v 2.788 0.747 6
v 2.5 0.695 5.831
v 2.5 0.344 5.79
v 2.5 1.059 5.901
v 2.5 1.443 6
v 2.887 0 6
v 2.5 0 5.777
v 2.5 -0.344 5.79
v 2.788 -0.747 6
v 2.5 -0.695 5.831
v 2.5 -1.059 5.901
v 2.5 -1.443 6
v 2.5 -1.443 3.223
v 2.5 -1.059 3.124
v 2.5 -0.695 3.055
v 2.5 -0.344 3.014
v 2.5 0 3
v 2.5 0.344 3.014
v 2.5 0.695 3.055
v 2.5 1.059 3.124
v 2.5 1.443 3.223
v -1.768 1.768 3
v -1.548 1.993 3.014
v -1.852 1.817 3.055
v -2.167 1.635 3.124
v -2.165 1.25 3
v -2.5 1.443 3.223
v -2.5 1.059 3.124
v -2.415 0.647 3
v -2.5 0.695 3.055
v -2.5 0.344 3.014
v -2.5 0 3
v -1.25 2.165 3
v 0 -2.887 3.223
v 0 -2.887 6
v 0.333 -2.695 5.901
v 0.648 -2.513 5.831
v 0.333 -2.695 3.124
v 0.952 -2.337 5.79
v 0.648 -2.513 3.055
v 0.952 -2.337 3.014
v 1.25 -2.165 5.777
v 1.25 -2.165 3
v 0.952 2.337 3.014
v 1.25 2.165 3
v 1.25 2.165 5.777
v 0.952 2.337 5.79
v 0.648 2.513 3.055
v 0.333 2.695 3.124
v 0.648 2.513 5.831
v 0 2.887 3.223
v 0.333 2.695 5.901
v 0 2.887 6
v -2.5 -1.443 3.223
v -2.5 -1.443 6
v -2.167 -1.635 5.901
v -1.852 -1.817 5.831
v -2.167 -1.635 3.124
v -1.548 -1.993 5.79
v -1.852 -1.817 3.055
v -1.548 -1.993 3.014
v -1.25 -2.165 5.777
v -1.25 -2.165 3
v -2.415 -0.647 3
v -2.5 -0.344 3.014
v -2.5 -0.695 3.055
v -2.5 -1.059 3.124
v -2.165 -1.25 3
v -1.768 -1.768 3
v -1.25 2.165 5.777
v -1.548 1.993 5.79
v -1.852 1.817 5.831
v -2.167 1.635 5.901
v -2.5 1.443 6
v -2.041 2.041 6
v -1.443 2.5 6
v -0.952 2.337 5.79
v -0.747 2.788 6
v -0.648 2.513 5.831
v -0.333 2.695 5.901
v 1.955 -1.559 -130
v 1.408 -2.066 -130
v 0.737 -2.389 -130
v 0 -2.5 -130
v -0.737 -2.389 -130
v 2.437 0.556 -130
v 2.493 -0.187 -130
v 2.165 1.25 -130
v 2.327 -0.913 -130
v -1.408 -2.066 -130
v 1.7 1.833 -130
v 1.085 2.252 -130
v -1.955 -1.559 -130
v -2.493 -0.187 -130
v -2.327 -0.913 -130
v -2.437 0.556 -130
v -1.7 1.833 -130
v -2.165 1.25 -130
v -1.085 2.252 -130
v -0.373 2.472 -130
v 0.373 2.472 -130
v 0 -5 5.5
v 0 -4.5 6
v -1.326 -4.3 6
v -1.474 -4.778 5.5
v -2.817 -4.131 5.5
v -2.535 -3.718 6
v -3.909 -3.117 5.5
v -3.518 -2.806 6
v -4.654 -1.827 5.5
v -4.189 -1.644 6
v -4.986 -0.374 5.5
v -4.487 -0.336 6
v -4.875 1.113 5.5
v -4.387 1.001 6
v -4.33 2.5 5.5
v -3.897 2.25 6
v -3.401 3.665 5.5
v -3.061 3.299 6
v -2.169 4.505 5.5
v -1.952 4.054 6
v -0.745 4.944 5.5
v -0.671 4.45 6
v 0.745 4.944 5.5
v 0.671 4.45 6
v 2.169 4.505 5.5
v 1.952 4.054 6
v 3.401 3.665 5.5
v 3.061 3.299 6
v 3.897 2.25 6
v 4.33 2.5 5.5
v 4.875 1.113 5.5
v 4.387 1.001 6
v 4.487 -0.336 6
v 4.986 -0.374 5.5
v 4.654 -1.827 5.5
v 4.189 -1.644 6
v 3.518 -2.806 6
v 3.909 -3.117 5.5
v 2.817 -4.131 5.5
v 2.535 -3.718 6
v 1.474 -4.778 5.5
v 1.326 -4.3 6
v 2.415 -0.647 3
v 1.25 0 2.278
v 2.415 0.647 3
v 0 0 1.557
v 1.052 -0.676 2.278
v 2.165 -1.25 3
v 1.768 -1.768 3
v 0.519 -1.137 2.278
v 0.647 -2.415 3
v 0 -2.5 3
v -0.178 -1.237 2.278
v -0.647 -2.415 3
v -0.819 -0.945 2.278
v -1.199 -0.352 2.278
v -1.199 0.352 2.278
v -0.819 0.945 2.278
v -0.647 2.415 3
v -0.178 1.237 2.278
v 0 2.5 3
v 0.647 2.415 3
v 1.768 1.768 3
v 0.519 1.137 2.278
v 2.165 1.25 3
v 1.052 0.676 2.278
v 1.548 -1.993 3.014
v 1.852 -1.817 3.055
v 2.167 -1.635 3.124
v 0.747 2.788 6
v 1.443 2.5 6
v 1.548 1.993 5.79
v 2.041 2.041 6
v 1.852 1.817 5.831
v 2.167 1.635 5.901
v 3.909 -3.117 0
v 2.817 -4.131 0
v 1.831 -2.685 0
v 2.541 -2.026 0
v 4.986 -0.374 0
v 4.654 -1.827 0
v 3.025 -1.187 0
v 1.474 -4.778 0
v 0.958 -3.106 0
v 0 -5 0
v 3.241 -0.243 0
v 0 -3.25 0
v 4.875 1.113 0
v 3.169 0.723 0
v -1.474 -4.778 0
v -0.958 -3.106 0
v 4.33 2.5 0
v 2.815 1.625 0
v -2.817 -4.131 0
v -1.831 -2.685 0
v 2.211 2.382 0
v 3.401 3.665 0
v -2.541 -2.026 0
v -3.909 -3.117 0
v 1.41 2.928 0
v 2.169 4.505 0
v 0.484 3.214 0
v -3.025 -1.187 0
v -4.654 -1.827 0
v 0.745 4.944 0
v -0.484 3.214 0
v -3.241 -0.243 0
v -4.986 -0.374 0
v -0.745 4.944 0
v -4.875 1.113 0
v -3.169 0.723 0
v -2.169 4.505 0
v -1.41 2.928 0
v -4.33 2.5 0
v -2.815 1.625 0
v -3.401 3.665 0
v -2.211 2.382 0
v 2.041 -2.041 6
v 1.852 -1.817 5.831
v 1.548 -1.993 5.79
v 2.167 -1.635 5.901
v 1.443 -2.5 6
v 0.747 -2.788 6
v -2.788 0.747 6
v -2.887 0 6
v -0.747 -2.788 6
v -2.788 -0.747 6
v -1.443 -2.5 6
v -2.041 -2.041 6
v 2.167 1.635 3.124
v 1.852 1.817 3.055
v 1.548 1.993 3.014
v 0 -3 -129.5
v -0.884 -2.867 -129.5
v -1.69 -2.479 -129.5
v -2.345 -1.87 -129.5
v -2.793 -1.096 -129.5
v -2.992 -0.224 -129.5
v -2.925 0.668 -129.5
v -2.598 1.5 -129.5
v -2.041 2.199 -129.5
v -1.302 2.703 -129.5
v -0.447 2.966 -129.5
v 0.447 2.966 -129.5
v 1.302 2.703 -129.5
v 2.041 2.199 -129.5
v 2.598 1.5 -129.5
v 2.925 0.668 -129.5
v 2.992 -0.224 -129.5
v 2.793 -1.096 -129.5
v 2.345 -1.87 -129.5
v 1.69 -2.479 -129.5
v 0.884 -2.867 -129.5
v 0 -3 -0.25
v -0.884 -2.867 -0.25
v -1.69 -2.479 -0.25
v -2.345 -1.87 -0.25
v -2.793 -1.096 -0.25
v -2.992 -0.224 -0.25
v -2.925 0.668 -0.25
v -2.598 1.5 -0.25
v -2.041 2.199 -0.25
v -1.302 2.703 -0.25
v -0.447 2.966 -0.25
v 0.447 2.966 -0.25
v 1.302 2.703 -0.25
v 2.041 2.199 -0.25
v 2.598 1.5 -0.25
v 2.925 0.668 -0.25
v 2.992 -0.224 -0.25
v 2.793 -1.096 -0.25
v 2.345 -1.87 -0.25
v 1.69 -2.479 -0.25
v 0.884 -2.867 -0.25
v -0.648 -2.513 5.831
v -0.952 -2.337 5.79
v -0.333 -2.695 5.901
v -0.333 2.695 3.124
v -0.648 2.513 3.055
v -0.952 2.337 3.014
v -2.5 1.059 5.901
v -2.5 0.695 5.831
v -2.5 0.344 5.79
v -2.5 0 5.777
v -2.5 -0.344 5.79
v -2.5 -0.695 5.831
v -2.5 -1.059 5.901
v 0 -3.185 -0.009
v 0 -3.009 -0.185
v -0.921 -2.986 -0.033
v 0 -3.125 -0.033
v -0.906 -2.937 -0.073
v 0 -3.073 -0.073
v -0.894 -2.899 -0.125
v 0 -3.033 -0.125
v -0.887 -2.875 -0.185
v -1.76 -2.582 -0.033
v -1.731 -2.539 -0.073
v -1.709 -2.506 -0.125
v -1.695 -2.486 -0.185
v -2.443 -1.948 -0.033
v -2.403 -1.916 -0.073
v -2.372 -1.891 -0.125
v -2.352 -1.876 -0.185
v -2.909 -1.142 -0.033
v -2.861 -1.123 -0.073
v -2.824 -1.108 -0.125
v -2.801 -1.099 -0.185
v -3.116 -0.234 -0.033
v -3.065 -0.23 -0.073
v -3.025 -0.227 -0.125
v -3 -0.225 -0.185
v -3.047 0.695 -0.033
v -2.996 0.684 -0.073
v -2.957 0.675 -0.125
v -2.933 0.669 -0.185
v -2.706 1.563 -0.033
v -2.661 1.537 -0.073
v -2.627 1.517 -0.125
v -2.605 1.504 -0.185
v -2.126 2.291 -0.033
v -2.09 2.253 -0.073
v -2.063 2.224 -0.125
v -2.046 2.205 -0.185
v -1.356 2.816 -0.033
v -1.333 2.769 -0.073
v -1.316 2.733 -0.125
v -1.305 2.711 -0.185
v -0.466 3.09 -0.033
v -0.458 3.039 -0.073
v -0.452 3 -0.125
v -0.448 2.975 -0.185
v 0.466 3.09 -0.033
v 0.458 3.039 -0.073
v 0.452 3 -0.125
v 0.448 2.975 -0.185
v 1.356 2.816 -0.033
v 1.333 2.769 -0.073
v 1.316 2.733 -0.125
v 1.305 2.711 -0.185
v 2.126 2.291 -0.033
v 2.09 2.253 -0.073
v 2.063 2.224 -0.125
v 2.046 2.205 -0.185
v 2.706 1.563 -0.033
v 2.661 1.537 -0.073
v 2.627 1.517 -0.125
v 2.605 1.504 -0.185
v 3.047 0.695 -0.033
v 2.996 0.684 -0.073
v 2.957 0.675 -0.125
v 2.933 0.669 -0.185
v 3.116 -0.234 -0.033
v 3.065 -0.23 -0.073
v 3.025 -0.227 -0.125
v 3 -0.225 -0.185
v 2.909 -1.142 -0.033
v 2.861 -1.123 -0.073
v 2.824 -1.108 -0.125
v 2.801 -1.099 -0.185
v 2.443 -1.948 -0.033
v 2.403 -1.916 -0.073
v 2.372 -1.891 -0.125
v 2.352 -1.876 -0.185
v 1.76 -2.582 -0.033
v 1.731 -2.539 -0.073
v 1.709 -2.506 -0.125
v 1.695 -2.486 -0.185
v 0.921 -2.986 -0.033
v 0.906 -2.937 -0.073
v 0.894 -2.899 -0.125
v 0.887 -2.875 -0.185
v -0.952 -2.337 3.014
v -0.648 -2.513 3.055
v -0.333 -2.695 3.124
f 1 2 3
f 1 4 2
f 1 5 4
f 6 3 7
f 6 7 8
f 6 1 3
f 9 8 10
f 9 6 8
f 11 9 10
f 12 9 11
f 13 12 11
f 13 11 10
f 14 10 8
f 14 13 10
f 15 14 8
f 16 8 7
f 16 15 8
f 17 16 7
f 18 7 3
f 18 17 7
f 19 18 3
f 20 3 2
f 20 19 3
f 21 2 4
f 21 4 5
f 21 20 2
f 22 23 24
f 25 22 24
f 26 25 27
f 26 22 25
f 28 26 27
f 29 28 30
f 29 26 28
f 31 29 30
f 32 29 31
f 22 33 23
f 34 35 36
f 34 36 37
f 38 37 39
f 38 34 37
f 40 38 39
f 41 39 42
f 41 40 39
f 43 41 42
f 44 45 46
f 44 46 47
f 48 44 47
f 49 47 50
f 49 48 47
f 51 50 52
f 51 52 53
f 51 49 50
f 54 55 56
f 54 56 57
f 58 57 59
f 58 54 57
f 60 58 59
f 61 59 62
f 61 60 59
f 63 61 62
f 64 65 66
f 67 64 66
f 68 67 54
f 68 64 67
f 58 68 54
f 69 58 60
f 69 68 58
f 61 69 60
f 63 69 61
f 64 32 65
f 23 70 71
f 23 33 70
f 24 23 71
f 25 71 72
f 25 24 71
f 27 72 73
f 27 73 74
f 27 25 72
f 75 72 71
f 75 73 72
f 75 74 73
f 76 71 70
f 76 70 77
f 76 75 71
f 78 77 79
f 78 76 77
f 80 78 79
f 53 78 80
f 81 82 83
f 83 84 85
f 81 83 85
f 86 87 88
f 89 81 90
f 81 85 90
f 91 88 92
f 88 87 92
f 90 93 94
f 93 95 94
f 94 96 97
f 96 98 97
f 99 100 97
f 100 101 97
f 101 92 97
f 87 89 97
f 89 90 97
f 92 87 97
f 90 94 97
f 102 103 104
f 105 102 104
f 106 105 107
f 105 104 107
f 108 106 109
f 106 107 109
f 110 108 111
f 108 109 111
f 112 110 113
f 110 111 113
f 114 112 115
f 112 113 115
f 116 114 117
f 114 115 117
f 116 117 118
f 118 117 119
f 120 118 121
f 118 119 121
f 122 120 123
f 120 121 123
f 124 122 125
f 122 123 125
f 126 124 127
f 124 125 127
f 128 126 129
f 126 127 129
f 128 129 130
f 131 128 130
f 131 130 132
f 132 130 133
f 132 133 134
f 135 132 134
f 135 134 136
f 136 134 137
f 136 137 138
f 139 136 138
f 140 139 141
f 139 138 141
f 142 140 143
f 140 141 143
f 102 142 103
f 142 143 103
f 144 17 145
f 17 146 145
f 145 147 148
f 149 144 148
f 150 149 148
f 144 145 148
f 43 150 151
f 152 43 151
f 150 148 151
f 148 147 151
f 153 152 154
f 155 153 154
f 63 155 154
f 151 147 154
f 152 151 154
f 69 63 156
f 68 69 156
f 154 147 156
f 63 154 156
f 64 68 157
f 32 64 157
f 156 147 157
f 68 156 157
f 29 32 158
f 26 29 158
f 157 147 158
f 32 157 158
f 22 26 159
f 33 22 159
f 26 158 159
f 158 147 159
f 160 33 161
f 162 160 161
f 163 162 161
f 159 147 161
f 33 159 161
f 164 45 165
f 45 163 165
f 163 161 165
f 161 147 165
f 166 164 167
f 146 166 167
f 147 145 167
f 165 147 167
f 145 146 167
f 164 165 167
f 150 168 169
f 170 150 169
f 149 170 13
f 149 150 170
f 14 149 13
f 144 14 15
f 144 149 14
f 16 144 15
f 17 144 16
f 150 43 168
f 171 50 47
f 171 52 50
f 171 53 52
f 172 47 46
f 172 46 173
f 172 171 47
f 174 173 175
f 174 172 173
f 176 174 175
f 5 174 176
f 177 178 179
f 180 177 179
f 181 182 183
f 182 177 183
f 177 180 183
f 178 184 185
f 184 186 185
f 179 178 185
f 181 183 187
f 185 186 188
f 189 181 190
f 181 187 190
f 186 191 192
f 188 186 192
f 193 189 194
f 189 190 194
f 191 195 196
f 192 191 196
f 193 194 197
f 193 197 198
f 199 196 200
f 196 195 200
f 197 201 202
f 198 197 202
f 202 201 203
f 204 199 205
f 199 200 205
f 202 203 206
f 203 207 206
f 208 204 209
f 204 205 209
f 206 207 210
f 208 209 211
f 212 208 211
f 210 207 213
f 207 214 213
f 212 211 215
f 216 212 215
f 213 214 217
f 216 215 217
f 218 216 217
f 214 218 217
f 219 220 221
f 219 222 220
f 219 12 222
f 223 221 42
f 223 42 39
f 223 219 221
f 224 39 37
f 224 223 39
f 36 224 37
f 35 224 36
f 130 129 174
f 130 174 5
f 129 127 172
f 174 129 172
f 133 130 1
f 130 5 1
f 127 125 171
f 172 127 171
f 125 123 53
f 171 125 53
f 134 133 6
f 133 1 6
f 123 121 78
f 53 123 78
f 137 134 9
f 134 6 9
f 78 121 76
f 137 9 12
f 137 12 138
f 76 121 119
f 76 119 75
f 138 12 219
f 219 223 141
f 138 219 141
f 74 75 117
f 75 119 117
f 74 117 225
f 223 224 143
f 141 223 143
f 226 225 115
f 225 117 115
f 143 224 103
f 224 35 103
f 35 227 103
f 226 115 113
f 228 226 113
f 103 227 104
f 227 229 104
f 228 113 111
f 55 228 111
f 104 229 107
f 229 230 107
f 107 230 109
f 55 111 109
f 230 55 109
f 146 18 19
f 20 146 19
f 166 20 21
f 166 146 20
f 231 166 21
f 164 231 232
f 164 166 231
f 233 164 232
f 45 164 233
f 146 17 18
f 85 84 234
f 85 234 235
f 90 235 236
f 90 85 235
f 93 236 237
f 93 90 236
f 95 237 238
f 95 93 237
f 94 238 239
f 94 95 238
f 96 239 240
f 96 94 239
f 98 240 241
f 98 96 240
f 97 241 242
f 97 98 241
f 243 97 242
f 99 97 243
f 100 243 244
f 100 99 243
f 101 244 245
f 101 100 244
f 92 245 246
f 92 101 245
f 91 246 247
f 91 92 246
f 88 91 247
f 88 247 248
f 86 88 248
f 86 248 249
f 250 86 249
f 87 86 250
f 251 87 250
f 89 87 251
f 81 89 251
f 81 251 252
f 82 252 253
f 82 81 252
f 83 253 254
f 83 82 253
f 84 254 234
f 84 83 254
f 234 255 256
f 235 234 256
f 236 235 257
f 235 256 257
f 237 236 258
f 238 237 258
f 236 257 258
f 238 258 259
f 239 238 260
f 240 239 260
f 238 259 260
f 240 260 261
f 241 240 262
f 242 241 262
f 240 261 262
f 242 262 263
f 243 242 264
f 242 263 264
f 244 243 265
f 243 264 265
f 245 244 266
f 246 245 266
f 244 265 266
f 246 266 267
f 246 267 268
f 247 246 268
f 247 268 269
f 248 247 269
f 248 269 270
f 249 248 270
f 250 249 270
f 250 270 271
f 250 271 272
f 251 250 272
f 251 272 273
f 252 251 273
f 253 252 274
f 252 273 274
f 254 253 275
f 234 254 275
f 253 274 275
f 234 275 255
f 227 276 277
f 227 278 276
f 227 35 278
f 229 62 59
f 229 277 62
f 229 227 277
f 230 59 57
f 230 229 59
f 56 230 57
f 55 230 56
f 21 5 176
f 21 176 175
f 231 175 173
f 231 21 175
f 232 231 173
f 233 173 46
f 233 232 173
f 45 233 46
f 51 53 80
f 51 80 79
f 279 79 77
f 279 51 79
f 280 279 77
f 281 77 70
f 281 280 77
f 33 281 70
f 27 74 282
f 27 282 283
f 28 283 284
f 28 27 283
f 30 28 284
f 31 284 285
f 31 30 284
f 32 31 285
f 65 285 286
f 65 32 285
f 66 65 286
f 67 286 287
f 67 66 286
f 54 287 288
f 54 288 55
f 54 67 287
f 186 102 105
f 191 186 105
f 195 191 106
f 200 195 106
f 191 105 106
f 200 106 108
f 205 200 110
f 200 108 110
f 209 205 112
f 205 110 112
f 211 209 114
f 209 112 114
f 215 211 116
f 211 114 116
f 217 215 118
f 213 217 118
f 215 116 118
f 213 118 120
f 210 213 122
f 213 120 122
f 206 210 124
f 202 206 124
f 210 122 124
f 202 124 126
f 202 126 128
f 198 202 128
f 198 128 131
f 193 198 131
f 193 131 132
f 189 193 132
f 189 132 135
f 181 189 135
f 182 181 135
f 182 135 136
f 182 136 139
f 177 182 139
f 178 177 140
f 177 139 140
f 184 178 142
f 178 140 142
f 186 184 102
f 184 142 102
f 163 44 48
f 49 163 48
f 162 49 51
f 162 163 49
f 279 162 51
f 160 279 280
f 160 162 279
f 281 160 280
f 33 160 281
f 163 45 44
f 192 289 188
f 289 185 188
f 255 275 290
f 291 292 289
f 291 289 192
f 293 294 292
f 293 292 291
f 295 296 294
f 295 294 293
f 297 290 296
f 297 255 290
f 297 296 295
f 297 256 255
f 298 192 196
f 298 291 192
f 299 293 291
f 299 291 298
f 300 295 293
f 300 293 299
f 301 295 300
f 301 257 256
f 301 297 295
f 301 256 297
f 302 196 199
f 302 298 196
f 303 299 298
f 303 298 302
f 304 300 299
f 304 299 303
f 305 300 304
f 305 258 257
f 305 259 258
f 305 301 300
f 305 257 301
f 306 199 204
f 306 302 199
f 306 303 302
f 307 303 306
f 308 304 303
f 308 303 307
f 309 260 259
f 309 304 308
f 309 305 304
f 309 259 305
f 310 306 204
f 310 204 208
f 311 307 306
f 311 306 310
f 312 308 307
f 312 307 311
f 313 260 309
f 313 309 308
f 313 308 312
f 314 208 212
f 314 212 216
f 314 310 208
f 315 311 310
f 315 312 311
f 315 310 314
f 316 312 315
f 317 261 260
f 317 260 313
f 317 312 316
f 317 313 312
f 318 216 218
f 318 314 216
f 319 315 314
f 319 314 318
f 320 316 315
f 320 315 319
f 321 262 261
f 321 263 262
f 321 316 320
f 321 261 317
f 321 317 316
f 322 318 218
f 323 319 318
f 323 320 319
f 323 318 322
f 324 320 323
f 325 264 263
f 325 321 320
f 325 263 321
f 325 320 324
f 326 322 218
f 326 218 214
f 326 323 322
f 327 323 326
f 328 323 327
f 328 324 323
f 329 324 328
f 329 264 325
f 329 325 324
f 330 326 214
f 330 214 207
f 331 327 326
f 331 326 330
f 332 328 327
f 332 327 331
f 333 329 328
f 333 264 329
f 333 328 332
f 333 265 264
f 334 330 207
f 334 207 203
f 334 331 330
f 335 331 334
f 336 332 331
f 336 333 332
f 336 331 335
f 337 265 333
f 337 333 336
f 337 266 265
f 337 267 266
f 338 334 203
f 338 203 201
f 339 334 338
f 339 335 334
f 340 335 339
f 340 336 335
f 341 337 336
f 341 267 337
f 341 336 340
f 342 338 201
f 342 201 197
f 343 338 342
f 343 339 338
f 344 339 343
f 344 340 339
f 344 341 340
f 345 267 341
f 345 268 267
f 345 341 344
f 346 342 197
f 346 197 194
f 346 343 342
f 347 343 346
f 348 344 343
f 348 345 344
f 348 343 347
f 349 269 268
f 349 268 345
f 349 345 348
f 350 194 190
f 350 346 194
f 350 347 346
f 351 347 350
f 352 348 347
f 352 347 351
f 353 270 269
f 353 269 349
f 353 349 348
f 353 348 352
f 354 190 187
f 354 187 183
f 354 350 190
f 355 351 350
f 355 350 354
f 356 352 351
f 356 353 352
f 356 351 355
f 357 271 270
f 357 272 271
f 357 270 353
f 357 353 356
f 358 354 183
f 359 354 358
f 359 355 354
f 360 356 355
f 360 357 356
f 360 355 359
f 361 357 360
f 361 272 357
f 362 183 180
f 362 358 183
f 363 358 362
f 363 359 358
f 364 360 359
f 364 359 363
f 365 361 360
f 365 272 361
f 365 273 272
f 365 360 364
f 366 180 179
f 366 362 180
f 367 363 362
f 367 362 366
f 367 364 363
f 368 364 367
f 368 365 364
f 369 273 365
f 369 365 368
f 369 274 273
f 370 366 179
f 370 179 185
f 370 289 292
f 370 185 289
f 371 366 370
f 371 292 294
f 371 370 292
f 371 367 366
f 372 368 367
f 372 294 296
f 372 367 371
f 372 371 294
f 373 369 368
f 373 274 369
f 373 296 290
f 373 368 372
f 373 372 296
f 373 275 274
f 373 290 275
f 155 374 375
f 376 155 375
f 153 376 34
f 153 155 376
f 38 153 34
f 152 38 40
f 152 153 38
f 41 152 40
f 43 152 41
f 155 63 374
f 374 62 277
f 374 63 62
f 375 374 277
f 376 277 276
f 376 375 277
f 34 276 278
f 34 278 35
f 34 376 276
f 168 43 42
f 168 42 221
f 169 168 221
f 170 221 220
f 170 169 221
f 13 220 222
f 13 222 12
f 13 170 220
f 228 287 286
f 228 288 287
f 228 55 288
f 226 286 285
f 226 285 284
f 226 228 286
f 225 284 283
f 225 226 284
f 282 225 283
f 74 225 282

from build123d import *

# Parameters (mm, degrees)
CHAMFER1_SIZE      = 0.5
CUT_EXTRUDE1_REACH = 138.184
FILLET2_R          = 0.25


with BuildPart() as part:
    # Sketch1 → Revolve1 (revolve)
    with BuildSketch(Plane(origin=(0, 0, 0), x_dir=(0, 0, -1), z_dir=(1, 0, 0))):
        Polygon((0, 5), (-6, 5), (-6, 0), (130, 0), (130, 3), (0, 3), align=None)
    revolve(axis=Axis((0, 0, 6), (0, 0, -1)))

    # Sketch7 → Cut-Revolve2 (revolve, cut)
    with BuildSketch(Plane(origin=(0, 0, 0), x_dir=(0, 0, -1), z_dir=(1, 0, 0))):
        Polygon((-6, 0), (-6, 2.5), (-3, 2.5), (-1.556624327, 0), align=None)
    revolve(axis=Axis((0, 0, 6), (0, 0, -1)), mode=Mode.SUBTRACT)

    # Chamfer1
    chamfer1_edges = [part.edges().sort_by_distance(p)[0] for p in [
        (0, -3, -130),
        (0, -5, 6),
    ]]
    chamfer(chamfer1_edges, length=CHAMFER1_SIZE)

    # Cut-Extrude1: up to this cone (the profile starts inside it)
    cut_extrude1_end = Plane(origin=(0, 0, 6), z_dir=(0, 0, 1)).offset(-4.443374673) * Cone(1.732e-06, 261.234013639, 150.823527096, align=(Align.CENTER, Align.CENTER, Align.MIN), mode=Mode.PRIVATE)
    # Sketch8 → Cut-Extrude1 (cut, up to the surface)
    with BuildSketch(Plane.XY.offset(6), mode=Mode.PRIVATE) as cut_extrude1_sk1:
        Polygon((0, 2.886751346), (-2.5, 1.443375673), (-2.5, -1.443375673), (0, -2.886751346), (2.5, -1.443375673), (2.5, 1.443375673), align=None)
    cut_extrude1_tool1 = extrude(cut_extrude1_sk1.sketch, amount=-CUT_EXTRUDE1_REACH, mode=Mode.PRIVATE) & cut_extrude1_end
    add(cut_extrude1_tool1.solids().sort_by_distance((0, 0, 6))[0], mode=Mode.SUBTRACT)

    # Sketch9 → Cut-Revolve3 (revolve, cut)
    with BuildSketch(Plane(origin=(0, 0, 0), x_dir=(0, 0, -1), z_dir=(1, 0, 0))):
        Polygon((-6.5, 3.75277675), (-6.5, 2.5), (-5.776709006, 2.5), align=None)
    revolve(axis=Axis((0, 0, 6), (0, 0, -1)), mode=Mode.SUBTRACT)

    # Fillet2
    fillet2_edges = [part.edges().sort_by_distance(p)[0] for p in [
        (0, -3, 0),
    ]]
    fillet(fillet2_edges, radius=FILLET2_R)


solid = part.part
